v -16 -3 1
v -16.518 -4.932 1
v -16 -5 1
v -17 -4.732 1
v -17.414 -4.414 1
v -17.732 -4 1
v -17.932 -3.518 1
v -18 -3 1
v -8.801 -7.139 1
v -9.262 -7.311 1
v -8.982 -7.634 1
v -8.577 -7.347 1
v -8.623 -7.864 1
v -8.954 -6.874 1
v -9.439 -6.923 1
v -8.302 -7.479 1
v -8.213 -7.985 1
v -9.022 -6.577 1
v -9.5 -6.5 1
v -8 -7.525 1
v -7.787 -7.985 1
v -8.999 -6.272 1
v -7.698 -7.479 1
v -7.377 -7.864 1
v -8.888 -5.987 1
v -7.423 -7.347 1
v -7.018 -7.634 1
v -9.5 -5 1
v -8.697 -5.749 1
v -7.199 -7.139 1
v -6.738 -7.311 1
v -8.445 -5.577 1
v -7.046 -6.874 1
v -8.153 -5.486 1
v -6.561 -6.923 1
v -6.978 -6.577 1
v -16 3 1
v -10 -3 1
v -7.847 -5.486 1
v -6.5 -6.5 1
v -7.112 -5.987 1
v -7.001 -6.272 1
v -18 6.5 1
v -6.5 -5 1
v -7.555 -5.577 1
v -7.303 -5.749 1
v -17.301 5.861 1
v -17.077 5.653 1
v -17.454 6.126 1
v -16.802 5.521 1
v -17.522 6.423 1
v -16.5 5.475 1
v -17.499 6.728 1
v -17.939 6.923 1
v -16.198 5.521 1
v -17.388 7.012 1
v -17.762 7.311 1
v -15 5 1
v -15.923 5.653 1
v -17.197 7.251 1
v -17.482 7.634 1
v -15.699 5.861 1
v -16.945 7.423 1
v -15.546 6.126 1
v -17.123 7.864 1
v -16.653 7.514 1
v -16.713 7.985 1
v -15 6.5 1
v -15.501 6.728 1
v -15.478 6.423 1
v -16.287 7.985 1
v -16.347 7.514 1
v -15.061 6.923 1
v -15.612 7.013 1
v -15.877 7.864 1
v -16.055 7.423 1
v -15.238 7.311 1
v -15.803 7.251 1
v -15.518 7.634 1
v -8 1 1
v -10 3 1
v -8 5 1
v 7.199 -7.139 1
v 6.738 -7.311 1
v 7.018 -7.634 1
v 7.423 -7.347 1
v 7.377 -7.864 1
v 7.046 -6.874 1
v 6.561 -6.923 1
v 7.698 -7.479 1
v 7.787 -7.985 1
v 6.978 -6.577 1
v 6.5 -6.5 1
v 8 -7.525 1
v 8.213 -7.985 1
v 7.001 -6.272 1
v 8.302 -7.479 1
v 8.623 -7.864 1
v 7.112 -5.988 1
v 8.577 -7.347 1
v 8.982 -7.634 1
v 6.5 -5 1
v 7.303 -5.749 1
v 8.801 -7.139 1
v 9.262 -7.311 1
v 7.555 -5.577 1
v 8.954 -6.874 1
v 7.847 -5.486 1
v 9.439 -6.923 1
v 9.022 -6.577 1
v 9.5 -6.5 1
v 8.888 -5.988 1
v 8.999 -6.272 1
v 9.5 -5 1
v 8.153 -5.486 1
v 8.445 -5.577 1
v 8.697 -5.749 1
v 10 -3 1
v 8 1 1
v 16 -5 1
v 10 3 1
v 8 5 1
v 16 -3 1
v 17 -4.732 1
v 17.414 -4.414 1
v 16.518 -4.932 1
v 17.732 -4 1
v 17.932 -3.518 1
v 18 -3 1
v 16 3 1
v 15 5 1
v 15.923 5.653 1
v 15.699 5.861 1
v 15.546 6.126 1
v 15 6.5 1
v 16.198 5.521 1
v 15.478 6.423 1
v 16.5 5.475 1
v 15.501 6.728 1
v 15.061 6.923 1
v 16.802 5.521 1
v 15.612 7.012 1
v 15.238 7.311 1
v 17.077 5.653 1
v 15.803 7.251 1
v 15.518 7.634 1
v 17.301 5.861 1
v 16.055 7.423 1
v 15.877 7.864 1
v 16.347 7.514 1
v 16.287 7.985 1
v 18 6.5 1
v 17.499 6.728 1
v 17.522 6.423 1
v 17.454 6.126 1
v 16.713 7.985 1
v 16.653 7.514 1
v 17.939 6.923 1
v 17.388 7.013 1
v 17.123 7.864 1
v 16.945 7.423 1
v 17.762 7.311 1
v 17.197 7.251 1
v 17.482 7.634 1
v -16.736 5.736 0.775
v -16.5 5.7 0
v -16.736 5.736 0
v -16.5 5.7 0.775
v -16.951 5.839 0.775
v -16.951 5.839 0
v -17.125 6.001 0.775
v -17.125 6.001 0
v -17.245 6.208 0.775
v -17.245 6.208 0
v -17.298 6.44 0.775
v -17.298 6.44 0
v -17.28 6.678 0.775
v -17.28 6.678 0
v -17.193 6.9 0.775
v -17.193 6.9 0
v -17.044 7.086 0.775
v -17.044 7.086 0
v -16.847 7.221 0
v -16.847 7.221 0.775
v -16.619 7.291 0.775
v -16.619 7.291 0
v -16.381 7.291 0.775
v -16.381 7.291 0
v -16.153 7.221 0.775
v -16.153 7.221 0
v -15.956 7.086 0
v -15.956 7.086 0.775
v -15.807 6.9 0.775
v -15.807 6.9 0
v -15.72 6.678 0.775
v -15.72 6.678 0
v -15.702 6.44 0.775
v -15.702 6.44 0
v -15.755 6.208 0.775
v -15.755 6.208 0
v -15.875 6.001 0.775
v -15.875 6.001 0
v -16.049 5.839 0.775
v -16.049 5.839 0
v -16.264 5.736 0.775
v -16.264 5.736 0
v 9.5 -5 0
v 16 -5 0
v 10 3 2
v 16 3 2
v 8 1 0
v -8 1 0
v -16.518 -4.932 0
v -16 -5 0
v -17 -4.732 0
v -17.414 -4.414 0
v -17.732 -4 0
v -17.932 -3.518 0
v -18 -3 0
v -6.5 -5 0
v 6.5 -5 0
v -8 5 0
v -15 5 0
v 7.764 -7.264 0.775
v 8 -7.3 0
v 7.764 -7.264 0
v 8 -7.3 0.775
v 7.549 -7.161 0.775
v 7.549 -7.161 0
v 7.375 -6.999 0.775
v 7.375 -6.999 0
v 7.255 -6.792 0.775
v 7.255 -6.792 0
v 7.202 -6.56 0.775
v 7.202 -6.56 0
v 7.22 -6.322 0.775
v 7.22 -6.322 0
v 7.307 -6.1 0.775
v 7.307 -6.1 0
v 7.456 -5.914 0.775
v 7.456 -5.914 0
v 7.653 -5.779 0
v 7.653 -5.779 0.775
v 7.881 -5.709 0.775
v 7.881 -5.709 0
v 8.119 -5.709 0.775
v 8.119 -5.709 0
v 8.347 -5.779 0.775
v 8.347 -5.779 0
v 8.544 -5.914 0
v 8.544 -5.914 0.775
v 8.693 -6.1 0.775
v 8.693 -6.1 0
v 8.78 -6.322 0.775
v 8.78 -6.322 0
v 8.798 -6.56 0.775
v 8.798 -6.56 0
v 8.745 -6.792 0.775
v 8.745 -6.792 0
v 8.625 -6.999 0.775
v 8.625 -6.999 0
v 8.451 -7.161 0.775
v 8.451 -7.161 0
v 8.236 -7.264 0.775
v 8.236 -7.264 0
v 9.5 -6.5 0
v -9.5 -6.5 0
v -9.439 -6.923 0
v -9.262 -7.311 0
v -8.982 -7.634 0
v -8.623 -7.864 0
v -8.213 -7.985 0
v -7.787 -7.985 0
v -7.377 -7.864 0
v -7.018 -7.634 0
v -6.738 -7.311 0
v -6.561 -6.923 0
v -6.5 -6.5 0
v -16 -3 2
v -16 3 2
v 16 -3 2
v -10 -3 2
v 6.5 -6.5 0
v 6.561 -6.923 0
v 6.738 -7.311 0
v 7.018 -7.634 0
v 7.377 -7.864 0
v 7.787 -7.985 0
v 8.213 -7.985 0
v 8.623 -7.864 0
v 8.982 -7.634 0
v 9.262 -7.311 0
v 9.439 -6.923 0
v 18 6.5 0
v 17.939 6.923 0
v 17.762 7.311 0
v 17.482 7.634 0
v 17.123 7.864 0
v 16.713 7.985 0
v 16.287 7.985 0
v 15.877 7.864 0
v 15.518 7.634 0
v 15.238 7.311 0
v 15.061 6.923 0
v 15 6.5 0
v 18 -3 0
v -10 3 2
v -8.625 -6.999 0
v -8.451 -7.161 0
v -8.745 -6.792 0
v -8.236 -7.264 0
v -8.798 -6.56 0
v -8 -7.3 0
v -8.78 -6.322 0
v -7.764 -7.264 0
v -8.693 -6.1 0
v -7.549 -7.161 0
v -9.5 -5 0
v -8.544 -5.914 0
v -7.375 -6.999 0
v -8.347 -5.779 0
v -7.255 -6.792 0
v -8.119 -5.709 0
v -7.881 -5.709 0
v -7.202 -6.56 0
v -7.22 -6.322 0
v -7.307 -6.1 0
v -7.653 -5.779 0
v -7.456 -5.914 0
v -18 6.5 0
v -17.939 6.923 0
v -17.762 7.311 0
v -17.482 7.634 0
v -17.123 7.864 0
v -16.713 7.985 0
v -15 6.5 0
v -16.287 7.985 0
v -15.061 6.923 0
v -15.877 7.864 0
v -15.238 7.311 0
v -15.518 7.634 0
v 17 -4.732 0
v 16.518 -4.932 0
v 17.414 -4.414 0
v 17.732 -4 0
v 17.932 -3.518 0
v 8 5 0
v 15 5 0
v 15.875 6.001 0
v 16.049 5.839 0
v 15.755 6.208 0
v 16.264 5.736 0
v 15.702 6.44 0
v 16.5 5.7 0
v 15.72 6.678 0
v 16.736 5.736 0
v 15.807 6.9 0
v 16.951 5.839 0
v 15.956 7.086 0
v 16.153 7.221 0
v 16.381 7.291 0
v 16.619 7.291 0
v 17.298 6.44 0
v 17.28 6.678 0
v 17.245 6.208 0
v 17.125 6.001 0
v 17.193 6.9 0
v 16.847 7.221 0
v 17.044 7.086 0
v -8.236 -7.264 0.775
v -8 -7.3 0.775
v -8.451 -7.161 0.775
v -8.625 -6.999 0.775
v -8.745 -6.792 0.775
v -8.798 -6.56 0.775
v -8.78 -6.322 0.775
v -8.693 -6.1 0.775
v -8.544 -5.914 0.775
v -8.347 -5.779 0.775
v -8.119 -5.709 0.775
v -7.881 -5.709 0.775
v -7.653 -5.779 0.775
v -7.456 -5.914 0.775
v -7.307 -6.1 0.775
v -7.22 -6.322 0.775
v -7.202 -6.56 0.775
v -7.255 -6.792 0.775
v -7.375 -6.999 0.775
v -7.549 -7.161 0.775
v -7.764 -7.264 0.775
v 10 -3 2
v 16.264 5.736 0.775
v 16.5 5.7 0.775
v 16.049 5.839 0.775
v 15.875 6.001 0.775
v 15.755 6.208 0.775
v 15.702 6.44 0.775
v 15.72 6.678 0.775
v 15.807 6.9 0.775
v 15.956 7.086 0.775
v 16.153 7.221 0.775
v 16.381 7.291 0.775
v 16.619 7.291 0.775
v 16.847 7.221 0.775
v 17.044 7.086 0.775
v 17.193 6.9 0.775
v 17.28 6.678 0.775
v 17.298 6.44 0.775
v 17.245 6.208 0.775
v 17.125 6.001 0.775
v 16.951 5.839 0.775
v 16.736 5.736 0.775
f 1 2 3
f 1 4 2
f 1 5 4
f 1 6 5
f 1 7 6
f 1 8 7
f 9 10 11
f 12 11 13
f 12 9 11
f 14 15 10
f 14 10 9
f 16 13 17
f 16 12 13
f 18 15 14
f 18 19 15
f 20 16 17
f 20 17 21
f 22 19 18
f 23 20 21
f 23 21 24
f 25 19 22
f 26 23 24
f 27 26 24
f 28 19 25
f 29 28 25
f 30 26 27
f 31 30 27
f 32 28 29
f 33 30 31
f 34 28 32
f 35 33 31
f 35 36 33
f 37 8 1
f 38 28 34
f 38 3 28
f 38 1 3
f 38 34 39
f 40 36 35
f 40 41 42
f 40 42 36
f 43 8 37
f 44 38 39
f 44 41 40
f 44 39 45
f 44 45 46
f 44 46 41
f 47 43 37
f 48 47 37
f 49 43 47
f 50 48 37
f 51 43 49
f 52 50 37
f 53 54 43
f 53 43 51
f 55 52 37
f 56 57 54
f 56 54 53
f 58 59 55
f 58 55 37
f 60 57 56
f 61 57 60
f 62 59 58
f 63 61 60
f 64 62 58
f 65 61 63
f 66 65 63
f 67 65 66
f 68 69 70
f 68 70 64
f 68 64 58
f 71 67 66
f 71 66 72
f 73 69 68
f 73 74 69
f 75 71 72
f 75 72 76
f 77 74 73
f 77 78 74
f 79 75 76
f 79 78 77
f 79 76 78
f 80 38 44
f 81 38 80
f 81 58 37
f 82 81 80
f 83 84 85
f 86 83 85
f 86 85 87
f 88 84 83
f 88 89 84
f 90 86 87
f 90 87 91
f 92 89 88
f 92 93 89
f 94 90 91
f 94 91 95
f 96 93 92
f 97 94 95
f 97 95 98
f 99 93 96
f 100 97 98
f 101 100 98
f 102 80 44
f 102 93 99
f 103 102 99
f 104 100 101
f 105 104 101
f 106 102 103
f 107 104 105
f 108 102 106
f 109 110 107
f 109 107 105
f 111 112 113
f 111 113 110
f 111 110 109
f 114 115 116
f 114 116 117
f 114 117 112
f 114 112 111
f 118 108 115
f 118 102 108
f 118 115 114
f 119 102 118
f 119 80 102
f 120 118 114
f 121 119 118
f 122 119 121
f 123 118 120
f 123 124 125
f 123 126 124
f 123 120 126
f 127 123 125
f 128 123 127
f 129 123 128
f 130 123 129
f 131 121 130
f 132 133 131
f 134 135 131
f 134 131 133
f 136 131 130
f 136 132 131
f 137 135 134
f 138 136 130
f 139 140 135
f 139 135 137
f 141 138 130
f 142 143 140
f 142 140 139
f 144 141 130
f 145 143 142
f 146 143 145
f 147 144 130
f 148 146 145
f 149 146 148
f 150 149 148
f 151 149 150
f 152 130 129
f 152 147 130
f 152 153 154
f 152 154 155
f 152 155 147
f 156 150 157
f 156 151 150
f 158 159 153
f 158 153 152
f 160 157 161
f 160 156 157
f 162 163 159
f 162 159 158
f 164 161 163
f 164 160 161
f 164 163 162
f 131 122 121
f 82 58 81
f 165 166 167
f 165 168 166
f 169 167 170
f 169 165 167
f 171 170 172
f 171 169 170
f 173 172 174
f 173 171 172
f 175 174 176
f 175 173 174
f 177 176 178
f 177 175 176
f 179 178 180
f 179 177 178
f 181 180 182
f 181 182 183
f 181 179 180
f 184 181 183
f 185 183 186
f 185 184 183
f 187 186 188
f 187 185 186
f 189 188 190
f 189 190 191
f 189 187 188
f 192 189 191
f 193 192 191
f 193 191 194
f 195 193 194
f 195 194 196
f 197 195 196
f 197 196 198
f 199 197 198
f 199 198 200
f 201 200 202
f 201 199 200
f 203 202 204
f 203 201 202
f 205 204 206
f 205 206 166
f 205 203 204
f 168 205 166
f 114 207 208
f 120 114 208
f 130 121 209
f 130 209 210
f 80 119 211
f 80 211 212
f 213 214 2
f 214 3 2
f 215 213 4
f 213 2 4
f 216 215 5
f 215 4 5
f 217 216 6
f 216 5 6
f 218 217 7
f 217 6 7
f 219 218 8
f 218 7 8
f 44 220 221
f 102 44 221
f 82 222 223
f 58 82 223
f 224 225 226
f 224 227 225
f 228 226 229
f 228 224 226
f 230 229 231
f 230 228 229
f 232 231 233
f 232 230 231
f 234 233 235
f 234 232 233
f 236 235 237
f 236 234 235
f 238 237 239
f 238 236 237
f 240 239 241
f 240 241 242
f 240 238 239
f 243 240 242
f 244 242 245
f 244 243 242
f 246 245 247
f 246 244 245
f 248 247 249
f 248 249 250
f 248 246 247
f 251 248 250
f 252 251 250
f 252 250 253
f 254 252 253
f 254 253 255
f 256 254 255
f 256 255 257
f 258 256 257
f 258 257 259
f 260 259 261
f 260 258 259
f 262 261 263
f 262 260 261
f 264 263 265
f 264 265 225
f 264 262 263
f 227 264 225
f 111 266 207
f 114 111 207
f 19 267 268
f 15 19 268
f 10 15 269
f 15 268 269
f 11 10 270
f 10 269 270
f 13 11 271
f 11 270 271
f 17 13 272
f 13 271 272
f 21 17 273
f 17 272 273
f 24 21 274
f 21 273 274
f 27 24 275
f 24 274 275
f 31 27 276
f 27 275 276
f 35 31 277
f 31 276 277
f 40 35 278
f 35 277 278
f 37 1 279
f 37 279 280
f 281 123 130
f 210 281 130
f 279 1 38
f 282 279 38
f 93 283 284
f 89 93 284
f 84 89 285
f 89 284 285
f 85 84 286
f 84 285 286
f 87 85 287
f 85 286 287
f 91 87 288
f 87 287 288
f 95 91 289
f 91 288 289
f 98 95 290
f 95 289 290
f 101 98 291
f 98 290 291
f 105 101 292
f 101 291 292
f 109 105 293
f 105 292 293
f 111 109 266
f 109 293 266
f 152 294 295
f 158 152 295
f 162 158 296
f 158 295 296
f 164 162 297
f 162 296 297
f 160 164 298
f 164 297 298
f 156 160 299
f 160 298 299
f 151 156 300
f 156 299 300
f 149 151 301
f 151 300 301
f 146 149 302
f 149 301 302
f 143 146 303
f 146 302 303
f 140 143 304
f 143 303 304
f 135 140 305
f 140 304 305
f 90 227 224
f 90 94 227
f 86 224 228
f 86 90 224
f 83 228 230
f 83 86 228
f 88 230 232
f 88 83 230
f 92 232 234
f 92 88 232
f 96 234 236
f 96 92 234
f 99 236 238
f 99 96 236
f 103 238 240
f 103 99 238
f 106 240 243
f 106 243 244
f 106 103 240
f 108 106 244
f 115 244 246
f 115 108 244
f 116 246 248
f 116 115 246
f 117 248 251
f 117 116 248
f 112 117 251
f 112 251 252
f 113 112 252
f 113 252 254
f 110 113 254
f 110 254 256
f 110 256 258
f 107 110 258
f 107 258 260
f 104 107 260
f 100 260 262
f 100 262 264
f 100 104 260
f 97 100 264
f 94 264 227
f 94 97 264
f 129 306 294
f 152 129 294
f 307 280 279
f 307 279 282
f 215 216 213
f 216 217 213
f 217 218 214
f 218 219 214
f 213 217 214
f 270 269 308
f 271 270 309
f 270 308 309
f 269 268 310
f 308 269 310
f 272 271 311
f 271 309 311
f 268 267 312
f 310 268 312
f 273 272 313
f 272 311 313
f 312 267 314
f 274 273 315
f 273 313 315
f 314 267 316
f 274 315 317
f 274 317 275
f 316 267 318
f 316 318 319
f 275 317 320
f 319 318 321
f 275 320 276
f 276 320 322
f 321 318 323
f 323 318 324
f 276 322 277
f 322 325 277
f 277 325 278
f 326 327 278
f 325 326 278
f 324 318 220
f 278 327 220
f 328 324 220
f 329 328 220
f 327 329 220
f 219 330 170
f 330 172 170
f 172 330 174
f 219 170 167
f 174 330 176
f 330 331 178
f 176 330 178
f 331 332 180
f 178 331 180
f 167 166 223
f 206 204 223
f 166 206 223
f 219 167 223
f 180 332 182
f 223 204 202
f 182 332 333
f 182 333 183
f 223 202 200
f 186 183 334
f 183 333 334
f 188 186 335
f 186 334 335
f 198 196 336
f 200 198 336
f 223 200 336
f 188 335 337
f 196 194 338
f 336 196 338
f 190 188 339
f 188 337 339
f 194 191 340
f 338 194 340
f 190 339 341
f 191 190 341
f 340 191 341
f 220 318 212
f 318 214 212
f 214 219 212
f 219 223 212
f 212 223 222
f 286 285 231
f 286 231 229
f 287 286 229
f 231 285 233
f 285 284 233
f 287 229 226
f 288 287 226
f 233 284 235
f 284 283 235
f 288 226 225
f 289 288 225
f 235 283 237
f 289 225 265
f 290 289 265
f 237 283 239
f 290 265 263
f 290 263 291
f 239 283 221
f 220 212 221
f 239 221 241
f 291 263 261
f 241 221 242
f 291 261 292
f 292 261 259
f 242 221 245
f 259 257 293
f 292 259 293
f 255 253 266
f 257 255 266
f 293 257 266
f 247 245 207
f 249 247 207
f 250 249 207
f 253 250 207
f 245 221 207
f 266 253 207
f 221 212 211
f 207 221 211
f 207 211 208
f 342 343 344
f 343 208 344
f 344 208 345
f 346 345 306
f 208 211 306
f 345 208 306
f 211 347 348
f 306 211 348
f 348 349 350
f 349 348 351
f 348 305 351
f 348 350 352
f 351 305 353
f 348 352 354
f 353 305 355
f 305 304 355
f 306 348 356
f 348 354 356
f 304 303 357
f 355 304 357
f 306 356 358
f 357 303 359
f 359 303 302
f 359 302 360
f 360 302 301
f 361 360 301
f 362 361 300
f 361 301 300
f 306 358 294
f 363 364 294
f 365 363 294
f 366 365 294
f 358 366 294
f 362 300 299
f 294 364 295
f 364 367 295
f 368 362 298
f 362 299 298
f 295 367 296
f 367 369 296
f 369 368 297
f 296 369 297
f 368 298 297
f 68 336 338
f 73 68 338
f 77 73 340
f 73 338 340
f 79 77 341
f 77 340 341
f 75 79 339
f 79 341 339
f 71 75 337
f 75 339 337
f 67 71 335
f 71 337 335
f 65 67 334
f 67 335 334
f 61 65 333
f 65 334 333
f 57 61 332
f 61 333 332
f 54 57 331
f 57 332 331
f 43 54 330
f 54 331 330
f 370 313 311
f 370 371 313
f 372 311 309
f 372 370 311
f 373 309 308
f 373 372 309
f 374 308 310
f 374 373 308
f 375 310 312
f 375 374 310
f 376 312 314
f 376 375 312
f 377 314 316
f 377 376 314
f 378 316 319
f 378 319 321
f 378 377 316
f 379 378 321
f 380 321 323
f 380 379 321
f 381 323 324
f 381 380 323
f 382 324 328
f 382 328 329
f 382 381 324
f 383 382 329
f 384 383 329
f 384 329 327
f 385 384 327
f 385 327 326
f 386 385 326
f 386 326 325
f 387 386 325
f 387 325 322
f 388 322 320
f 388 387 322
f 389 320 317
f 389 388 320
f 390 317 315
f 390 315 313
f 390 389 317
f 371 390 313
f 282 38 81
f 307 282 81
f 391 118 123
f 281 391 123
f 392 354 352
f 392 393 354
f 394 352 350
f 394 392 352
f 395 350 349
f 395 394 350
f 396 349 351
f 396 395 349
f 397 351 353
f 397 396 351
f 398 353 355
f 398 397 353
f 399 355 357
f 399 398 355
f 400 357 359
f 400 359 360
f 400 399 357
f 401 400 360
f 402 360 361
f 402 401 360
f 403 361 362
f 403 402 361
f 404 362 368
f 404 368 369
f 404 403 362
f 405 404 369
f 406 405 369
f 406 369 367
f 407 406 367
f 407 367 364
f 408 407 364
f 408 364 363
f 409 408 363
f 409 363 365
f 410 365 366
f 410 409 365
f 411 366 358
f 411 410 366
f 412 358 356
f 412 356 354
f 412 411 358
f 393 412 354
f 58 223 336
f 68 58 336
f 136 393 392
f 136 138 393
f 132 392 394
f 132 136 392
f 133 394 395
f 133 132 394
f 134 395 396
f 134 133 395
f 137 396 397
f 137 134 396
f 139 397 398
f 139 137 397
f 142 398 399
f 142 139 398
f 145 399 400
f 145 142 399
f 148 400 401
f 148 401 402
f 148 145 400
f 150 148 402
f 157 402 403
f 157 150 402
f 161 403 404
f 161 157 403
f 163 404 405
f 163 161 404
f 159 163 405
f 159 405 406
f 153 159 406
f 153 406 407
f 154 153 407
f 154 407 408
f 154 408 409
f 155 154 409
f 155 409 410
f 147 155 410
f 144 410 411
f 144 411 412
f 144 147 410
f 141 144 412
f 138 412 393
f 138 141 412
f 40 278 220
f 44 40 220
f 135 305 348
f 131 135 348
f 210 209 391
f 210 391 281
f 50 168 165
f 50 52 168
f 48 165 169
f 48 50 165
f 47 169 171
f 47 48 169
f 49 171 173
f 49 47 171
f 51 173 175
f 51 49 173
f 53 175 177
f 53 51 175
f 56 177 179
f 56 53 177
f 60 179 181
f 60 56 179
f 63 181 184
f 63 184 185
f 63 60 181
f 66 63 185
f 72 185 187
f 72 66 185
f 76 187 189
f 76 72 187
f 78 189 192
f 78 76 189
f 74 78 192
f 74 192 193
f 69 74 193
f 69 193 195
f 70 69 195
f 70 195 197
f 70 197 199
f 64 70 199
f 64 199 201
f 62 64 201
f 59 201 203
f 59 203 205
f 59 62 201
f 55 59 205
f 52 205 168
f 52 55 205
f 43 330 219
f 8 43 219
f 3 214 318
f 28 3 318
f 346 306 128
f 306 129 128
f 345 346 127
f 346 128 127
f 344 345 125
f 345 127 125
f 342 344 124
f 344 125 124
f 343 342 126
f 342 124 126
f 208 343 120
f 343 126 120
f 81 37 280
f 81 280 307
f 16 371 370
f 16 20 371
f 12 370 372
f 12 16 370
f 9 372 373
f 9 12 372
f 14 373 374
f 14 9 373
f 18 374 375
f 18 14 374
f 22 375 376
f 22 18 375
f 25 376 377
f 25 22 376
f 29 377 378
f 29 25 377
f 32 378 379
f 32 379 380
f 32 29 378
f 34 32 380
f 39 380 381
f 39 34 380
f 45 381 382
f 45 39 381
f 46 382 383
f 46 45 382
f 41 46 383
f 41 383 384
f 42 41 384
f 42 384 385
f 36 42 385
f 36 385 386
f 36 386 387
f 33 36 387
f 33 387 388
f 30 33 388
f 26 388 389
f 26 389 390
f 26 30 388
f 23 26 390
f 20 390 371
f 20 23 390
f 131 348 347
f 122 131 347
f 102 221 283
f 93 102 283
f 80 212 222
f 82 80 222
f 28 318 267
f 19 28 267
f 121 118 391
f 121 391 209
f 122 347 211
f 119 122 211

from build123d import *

# Parameters (mm, degrees)
EXTRUDE_1_DEPTH             = 1
SKETCH_2_W                  = 6
SKETCH_2_H                  = 6
EXTRUDE_2_DEPTH             = 1
SKETCH_3_W                  = 20
SKETCH_3_H                  = 1
EXTRUDE_3_DEPTH             = 1.5
FILLET_1_R                  = 2
HOLE_WIZARD_M2_1_AT_2_COUNT = 2
HOLE_WIZARD_M2_1_AT_2_PITCH = 15.532224567
HOLE_WIZARD_M2_1_AT_3_COUNT = 2
HOLE_WIZARD_M2_1_AT_3_PITCH = 27.735356497
HOLE_WIZARD_M2_1_AT_4_COUNT = 2
HOLE_WIZARD_M2_1_AT_4_PITCH = 33
CUT_EXTRUDE_1_DEPTH         = 37.932370625


with BuildPart() as part:
    # 草图1 → 凸台-拉伸1 (new body)
    with BuildSketch(Plane.XY):
        Polygon((-8, 5), (-15, 5), (-16.499999995, 5), (-18, 5), (-18, -5), (-9.5, -5), (-8.000000003, -5), (-6.5, -5), (6.5, -5), (8, -5), (9.5, -5), (18, -5), (18, 5), (16.500000001, 5), (15, 5), (8, 5), (8, 1), (-8, 1), align=None)
        with BuildLine():
            ThreePointArc((-6.5, -6.5), (-6.939339829, -5.439339827), (-8.000000003, -5))
            ThreePointArc((-8.000000003, -5), (-9.060660173, -5.439339829), (-9.5, -6.5))
            Line((-9.5, -6.5), (-6.5, -6.5))
        make_face()
        with BuildLine():
            Line((-6.5, -6.5), (-9.5, -6.5))
            ThreePointArc((-9.5, -6.5), (-8, -8), (-6.5, -6.5))
        make_face()
        with BuildLine():
            Line((-8.000000003, -5), (-9.5, -5))
            Line((-9.5, -5), (-9.5, -6.5))
            ThreePointArc((-9.5, -6.5), (-9.060660173, -5.439339829), (-8.000000003, -5))
        make_face()
        with BuildLine():
            Line((-6.5, -5), (-8.000000003, -5))
            ThreePointArc((-8.000000003, -5), (-6.939339829, -5.439339827), (-6.5, -6.5))
            Line((-6.5, -6.5), (-6.5, -5))
        make_face()
        with BuildLine():
            ThreePointArc((9.5, -6.5), (9.060660172, -5.439339828), (8, -5))
            ThreePointArc((8, -5), (6.939339828, -5.439339828), (6.5, -6.5))
            Line((6.5, -6.5), (9.5, -6.5))
        make_face()
        with BuildLine():
            ThreePointArc((6.5, -6.5), (8, -8), (9.5, -6.5))
            Line((9.5, -6.5), (6.5, -6.5))
        make_face()
        with BuildLine():
            Line((8, -5), (6.5, -5))
            Line((6.5, -5), (6.5, -6.5))
            ThreePointArc((6.5, -6.5), (6.939339828, -5.439339828), (8, -5))
        make_face()
        with BuildLine():
            Line((9.5, -6.5), (9.5, -5))
            Line((9.5, -5), (8, -5))
            ThreePointArc((8, -5), (9.060660172, -5.439339828), (9.5, -6.5))
        make_face()
        with BuildLine():
            Line((-18, 5), (-16.499999995, 5))
            ThreePointArc((-16.499999995, 5), (-17.56066017, 5.439339826), (-18, 6.5))
            Line((-18, 6.5), (-18, 5))
        make_face()
        with BuildLine():
            ThreePointArc((-18, 6.5), (-17.56066017, 5.439339826), (-16.499999995, 5))
            ThreePointArc((-16.499999995, 5), (-15.439339826, 5.43933983), (-15, 6.5))
            Line((-15, 6.5), (-18, 6.5))
        make_face()
        with BuildLine():
            Line((-18, 6.5), (-15, 6.5))
            ThreePointArc((-15, 6.5), (-16.5, 8), (-18, 6.5))
        make_face()
        with BuildLine():
            Line((-16.499999995, 5), (-15, 5))
            Line((-15, 5), (-15, 6.5))
            ThreePointArc((-15, 6.5), (-15.439339826, 5.43933983), (-16.499999995, 5))
        make_face()
        with BuildLine():
            Line((15, 6.5), (15, 5))
            Line((15, 5), (16.500000001, 5))
            ThreePointArc((16.500000001, 5), (15.439339829, 5.439339828), (15, 6.5))
        make_face()
        with BuildLine():
            ThreePointArc((15, 6.5), (15.439339829, 5.439339828), (16.500000001, 5))
            ThreePointArc((16.500000001, 5), (17.560660172, 5.439339829), (18, 6.5))
            Line((18, 6.5), (15, 6.5))
        make_face()
        with BuildLine():
            ThreePointArc((18, 6.5), (16.5, 8), (15, 6.5))
            Line((15, 6.5), (18, 6.5))
        make_face()
        with BuildLine():
            ThreePointArc((18, 6.5), (17.560660172, 5.439339829), (16.500000001, 5))
            Line((16.500000001, 5), (18, 5))
            Line((18, 5), (18, 6.5))
        make_face()
    extrude(amount=EXTRUDE_1_DEPTH)

    # 草图2 → 凸台-拉伸2 (add)
    with BuildSketch(Plane.XY.offset(1)):
        with Locations((-13, 0)):
            Rectangle(SKETCH_2_W, SKETCH_2_H)
        with Locations((13, 0)):
            Rectangle(SKETCH_2_W, SKETCH_2_H)
    extrude(amount=EXTRUDE_2_DEPTH)

    # 草图3 → 凸台-拉伸3 (add)
    with BuildSketch(Plane(origin=(0, 0, 0), x_dir=(-1, 0, 0), z_dir=(0, 0, -1))):
        with Locations((2, 0.5)):
            Rectangle(SKETCH_3_W, SKETCH_3_H)
    extrude(amount=EXTRUDE_3_DEPTH)

    # 圆角1
    fillet_1_edges = [part.edges().sort_by_distance(p)[0] for p in [
        (18, -5, 0.5),
        (-18, -5, 0.5),
    ]]
    fillet(fillet_1_edges, radius=FILLET_1_R)

    # 草图5 → M2 螺纹孔1 (revolve, cut)
    with BuildSketch(Plane(origin=(-16.5, 6.5, 1), x_dir=(0, -1, 0), z_dir=(1, 0, 0))):
        Polygon((0, 0), (0, 1), (0.8, 1), (0.8, 0.225), (1.025, 0), align=None)
    hole_wizard_m2_1 = revolve(axis=Axis((-16.5, 6.5, 7.35), (0, 0, -1)), mode=Mode.SUBTRACT)

    # M2 螺纹孔1 at 2: M2 螺纹孔1 ×2
    with Locations(*[Vector(0.5472493629827028, -0.8369696139735456, 0) * (i * HOLE_WIZARD_M2_1_AT_2_PITCH) for i in range(1, HOLE_WIZARD_M2_1_AT_2_COUNT)]):
        add(hole_wizard_m2_1, mode=Mode.SUBTRACT)

    # M2 螺纹孔1 at 3: M2 螺纹孔1 ×2
    with Locations(*[Vector(0.8833490206949295, -0.46871580689935033, 0) * (i * HOLE_WIZARD_M2_1_AT_3_PITCH) for i in range(1, HOLE_WIZARD_M2_1_AT_3_COUNT)]):
        add(hole_wizard_m2_1, mode=Mode.SUBTRACT)

    # M2 螺纹孔1 at 4: M2 螺纹孔1 ×2
    with Locations(*[(i * HOLE_WIZARD_M2_1_AT_4_PITCH, 0, 0) for i in range(1, HOLE_WIZARD_M2_1_AT_4_COUNT)]):
        add(hole_wizard_m2_1, mode=Mode.SUBTRACT)

    # 草图7 → 切除-拉伸1 (cut, through all)
    with BuildSketch(Plane.ZY.offset(18)):
        Polygon((0, 52.66451622), (0, 8.533671193), (0, -8.947821263), (0, -53.078666291), (-88.261690055, -53.078666291), (-88.261690055, 52.66451622), align=None)
    extrude(amount=-CUT_EXTRUDE_1_DEPTH, mode=Mode.SUBTRACT)


solid = part.part
